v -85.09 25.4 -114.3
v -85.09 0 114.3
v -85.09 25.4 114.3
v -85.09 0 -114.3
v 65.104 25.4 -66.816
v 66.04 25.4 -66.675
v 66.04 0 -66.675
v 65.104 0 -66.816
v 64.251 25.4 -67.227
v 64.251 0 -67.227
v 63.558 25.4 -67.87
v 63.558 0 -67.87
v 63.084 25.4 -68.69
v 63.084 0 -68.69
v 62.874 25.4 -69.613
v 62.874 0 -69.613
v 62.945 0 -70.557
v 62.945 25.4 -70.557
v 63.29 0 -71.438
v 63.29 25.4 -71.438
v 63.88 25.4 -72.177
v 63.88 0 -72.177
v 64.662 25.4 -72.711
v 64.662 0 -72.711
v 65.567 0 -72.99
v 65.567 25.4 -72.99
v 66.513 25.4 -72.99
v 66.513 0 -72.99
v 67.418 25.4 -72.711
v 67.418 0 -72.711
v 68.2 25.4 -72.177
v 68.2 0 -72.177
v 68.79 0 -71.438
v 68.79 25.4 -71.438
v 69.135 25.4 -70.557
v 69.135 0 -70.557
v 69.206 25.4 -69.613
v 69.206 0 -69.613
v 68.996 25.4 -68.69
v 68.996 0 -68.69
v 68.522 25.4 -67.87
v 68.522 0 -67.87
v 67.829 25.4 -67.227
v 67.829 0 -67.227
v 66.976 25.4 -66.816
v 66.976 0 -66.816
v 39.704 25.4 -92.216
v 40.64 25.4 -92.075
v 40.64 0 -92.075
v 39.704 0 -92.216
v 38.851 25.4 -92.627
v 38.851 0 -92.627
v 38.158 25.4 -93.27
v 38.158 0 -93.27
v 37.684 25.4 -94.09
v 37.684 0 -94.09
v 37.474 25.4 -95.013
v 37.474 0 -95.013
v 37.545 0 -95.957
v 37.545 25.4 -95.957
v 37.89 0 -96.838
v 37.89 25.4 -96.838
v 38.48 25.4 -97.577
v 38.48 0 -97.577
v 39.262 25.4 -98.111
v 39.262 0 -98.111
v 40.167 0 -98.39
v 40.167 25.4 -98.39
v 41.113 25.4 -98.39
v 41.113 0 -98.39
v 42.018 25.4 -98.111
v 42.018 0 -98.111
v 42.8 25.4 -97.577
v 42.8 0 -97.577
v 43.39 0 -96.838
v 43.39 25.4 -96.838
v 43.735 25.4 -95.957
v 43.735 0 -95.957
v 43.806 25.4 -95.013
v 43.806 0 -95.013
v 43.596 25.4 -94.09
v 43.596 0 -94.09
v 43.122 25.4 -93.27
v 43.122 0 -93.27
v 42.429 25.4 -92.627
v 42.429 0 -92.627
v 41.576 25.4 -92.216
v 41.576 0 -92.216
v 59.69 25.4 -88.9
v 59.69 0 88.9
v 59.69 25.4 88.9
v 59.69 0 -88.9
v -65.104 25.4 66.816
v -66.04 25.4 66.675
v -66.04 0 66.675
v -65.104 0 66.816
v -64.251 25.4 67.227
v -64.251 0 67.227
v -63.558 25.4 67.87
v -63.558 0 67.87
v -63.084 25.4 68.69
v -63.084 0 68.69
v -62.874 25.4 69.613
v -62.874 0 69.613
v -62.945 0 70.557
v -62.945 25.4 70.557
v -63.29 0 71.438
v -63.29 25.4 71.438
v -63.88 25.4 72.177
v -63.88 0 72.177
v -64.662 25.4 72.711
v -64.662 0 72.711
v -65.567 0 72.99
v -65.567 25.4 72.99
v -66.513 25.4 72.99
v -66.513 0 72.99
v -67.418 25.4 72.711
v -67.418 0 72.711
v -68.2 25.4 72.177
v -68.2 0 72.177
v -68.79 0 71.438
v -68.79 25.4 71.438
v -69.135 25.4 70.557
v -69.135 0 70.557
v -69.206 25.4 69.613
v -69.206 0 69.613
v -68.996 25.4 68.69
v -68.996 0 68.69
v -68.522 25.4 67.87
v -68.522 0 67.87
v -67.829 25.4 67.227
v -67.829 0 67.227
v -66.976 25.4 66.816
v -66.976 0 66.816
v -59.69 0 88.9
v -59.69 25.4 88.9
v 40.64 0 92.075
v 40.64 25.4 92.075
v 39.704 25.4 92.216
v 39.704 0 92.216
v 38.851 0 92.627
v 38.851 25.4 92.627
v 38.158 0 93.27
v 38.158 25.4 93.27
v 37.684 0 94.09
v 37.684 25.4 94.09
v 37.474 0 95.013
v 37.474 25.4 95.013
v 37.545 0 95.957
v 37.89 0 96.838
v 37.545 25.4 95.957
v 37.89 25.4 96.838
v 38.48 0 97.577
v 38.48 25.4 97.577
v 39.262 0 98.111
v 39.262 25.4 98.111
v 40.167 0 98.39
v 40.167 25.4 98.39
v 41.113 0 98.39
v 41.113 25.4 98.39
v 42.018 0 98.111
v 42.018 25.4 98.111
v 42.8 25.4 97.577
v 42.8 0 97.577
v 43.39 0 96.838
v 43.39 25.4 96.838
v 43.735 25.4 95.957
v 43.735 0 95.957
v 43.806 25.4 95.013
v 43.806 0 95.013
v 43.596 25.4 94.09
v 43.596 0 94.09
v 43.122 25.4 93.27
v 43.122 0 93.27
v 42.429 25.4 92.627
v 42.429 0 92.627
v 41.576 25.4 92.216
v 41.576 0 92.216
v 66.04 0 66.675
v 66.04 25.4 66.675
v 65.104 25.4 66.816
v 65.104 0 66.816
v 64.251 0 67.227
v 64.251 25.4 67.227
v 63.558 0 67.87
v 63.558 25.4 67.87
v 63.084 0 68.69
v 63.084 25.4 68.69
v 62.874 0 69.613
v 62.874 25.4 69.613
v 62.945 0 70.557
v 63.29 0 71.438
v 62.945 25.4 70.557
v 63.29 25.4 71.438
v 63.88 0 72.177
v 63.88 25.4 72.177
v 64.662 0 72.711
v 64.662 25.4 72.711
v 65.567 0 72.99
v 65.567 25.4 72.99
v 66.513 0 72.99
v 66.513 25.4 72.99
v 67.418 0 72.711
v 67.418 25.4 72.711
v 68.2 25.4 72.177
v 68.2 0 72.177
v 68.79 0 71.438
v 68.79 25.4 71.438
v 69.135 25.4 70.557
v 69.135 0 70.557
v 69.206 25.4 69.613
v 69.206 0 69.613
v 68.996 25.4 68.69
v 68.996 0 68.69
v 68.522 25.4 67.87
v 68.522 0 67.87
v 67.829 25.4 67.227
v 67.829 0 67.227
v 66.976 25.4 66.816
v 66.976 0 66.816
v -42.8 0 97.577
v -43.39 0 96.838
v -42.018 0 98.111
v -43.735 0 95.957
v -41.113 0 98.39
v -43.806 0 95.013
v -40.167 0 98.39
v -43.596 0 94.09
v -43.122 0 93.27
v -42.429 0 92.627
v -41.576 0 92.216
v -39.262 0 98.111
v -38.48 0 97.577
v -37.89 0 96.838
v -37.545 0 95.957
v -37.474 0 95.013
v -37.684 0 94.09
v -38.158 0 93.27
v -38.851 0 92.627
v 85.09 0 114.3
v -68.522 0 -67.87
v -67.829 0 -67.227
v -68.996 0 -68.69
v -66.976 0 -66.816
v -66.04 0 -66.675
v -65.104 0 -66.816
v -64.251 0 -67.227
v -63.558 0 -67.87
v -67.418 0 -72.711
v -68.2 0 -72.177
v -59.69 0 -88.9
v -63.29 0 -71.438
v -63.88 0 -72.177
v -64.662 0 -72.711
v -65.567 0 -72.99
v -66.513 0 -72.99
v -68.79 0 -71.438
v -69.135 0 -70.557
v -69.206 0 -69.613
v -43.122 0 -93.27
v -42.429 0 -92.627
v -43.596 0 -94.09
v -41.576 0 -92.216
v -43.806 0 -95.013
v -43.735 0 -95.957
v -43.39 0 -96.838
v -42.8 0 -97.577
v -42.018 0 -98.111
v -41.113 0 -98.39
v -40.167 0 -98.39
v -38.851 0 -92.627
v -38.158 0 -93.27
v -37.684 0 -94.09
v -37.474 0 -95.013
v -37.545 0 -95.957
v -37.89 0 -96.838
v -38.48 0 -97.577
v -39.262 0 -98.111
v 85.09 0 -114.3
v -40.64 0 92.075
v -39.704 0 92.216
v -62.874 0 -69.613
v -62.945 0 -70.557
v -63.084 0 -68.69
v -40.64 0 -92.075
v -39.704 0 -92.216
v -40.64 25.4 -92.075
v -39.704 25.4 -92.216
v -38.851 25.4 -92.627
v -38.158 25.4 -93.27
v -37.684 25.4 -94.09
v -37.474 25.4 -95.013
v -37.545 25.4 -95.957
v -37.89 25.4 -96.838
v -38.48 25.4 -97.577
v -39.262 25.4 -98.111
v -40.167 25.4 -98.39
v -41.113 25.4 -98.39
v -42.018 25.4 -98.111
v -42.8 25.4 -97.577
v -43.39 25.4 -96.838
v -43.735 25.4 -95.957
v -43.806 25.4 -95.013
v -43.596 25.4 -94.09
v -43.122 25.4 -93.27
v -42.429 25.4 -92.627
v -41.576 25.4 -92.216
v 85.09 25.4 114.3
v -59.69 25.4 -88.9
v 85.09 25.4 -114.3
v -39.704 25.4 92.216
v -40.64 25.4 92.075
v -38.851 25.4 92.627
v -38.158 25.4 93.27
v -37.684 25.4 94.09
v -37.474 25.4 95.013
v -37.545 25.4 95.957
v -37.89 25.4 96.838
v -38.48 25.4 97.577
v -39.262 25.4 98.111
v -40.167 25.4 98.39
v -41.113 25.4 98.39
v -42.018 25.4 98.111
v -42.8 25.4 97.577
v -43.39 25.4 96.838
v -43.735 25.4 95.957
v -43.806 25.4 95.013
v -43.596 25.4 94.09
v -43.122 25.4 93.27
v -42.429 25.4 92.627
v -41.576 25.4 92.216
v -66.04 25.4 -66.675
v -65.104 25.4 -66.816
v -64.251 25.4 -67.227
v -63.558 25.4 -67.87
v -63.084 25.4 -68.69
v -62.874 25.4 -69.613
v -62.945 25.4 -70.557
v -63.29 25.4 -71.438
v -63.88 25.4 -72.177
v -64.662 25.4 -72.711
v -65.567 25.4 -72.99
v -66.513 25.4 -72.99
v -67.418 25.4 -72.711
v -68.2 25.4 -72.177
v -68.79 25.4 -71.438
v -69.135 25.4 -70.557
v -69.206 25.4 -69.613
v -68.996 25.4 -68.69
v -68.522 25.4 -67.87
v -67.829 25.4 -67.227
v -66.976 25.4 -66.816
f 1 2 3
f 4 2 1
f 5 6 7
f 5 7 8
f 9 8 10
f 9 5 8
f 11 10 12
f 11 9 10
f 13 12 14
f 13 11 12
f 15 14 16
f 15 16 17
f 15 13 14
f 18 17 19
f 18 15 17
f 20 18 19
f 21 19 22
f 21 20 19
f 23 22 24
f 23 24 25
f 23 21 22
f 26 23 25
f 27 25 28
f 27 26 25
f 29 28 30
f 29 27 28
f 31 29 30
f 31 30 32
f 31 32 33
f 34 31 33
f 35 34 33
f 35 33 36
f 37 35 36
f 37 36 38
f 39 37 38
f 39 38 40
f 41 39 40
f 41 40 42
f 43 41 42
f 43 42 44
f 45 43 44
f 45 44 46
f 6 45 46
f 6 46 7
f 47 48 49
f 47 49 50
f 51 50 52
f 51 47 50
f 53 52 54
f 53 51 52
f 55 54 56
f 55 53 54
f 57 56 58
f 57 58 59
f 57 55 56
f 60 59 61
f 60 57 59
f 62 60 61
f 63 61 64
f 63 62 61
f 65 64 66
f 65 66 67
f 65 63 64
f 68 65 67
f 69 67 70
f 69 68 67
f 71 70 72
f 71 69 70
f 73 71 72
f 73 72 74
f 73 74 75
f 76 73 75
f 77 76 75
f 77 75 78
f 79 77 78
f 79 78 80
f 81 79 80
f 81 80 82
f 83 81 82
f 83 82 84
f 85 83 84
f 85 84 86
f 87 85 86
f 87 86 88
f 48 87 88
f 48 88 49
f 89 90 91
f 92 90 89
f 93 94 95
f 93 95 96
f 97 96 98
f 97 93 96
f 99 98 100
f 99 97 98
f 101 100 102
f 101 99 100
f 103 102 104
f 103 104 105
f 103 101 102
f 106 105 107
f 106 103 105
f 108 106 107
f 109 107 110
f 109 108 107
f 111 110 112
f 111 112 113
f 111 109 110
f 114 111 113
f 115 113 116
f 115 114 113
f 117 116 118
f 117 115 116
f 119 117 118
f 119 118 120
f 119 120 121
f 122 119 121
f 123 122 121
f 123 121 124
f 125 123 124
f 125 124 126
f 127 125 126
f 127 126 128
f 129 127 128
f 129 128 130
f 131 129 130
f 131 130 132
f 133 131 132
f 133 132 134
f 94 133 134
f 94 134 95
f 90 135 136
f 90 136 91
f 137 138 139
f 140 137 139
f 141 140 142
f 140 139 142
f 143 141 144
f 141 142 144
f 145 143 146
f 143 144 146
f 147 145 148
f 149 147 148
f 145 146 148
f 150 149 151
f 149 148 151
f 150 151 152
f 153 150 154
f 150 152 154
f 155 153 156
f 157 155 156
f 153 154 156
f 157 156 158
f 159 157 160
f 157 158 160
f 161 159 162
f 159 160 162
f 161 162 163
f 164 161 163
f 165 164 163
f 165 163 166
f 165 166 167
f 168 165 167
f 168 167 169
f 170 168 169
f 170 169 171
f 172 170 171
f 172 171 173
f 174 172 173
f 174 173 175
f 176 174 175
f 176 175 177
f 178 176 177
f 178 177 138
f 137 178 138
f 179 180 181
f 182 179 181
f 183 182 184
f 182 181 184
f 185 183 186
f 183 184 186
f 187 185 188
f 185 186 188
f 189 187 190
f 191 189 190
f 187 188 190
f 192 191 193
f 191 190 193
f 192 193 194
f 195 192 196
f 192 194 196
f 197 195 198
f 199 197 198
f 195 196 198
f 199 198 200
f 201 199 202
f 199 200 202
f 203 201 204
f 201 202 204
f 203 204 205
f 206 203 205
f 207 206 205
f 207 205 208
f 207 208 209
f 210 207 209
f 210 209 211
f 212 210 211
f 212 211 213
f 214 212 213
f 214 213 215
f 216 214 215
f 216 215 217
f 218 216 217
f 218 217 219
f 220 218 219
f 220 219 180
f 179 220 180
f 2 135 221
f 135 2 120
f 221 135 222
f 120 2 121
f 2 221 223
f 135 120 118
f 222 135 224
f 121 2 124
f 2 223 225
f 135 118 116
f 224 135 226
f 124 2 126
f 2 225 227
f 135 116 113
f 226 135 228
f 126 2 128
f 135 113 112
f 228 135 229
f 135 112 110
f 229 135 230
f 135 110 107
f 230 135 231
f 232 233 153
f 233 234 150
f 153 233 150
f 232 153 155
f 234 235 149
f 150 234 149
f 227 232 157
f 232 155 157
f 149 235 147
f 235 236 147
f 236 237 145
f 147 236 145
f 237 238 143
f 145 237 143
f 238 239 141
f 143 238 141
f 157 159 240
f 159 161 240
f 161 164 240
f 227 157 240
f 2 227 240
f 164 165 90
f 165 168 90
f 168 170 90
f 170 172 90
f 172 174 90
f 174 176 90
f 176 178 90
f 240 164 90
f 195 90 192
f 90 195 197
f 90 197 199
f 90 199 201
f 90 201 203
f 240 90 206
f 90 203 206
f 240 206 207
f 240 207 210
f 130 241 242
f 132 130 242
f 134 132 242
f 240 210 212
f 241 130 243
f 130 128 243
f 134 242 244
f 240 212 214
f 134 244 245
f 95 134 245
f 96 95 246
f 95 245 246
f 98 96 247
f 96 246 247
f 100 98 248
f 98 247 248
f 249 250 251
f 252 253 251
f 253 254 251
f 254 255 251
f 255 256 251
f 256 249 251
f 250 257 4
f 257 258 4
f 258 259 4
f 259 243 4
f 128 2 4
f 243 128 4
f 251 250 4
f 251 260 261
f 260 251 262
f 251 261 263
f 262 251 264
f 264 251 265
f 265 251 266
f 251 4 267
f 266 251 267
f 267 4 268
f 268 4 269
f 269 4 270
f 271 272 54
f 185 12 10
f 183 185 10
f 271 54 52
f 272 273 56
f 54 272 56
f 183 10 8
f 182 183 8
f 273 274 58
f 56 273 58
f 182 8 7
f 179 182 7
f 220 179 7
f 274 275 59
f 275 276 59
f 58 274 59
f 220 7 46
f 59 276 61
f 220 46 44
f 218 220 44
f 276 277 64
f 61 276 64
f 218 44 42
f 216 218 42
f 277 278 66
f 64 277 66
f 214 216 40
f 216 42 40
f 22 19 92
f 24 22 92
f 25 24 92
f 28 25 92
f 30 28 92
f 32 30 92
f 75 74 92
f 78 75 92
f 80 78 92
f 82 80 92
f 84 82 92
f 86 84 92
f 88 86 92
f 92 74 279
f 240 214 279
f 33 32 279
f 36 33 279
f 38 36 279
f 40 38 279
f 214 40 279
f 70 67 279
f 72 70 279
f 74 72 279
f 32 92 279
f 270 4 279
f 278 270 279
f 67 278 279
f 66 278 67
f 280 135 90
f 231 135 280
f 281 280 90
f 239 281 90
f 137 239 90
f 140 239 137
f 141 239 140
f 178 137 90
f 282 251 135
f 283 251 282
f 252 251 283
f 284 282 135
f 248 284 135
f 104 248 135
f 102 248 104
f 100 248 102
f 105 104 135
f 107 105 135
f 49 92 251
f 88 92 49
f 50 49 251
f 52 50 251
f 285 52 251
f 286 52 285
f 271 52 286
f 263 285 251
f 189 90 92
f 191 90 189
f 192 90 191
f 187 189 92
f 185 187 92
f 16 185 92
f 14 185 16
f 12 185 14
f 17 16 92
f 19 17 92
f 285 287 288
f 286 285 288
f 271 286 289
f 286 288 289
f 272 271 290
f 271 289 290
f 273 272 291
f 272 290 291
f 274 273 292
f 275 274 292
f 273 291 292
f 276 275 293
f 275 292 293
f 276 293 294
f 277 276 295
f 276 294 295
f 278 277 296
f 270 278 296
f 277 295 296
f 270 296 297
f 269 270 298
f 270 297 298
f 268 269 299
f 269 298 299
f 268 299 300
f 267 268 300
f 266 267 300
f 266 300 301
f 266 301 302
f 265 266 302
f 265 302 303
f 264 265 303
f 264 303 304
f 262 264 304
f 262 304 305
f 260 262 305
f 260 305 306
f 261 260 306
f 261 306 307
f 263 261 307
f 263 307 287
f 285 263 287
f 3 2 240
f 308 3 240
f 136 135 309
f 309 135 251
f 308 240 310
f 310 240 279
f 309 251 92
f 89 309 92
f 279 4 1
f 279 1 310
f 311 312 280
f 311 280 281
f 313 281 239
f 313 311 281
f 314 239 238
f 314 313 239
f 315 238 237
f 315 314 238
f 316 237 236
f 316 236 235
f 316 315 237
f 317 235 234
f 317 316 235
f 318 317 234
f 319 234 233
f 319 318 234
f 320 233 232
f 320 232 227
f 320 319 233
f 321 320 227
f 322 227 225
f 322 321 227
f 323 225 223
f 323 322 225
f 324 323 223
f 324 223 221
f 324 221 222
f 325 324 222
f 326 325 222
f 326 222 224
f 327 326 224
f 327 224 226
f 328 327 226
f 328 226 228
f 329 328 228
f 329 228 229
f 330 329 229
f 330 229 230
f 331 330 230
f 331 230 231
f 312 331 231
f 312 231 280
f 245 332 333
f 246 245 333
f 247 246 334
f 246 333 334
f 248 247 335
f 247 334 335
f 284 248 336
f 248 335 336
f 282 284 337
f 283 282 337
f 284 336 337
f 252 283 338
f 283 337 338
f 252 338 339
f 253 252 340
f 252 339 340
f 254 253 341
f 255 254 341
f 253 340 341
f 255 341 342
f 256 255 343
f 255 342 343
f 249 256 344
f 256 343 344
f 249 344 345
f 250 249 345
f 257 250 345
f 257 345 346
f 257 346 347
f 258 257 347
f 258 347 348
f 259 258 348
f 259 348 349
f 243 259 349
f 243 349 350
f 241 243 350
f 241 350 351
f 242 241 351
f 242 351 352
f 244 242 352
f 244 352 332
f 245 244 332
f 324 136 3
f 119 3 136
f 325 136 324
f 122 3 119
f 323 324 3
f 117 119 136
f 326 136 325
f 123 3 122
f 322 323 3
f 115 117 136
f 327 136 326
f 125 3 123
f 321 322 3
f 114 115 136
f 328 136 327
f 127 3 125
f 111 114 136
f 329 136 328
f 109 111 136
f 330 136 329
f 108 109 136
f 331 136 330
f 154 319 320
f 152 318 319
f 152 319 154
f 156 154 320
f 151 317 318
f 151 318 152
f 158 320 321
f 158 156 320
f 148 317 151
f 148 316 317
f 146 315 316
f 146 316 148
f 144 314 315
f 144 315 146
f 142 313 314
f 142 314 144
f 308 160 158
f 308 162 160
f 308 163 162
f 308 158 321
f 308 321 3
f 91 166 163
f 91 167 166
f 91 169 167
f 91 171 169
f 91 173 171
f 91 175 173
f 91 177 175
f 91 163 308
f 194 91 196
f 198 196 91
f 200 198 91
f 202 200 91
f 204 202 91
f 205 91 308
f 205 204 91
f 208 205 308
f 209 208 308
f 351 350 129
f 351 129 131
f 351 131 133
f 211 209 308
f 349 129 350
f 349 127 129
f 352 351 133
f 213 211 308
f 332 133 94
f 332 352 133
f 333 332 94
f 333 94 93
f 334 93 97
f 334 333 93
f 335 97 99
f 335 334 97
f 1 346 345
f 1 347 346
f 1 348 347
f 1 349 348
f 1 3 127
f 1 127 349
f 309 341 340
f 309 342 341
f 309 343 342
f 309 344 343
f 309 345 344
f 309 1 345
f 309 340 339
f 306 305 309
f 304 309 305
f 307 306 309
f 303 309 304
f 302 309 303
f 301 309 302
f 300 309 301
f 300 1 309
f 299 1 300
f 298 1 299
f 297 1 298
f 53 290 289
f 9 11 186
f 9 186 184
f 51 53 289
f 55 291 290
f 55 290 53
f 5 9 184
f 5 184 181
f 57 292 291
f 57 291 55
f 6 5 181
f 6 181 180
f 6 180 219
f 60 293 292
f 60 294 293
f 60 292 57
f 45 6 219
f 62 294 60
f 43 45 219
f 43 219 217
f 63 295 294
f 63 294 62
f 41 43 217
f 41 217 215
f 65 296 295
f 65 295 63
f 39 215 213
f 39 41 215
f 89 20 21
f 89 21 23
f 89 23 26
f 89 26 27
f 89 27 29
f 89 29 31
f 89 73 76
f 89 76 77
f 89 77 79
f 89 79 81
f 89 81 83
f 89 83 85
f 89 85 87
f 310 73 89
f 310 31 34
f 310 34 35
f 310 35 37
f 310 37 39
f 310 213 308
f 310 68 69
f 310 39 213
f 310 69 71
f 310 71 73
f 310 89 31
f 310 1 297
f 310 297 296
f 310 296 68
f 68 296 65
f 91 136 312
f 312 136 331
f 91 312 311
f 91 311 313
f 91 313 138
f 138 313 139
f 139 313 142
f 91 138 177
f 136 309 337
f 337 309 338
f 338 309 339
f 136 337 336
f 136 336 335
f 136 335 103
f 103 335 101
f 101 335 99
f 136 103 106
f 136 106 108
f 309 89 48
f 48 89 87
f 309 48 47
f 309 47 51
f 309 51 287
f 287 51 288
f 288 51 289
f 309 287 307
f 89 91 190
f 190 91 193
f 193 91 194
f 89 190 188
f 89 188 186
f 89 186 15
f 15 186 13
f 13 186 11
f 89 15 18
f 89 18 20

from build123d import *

# Parameters (mm, degrees)
SKETCH2_W               = 170.18
SKETCH2_H               = 228.6
SKETCH2_W_2             = 119.38
SKETCH2_H_2             = 177.8
BOSS_EXTRUDE1_DEPTH     = 25.4
CUT_EXTRUDE1_REACH      = 146.741
SKETCH3_R               = 3.175
MIRROR2_COPY_1_REACH    = 146.741
MIRROR2_COPY_1_SKETCH_R = 3.175


with BuildPart() as part:
    # Sketch2 → Boss-Extrude1 (new body)
    with BuildSketch(Plane(origin=(0, 0, 0), x_dir=(1, 0, 0), z_dir=(0, 1, 0))):
        Rectangle(SKETCH2_W, SKETCH2_H)
        Rectangle(SKETCH2_W_2, SKETCH2_H_2, mode=Mode.SUBTRACT)
    extrude(amount=BOSS_EXTRUDE1_DEPTH)

    # Sketch3 → Cut-Extrude1 (cut, up to next)
    with BuildSketch(Plane(origin=(0, 25.4, 0), x_dir=(1, 0, 0), z_dir=(0, 1, 0)), mode=Mode.PRIVATE) as cut_extrude1_sk1:
        with Locations(Location((-66.04, 69.85, 0), (0, 0, 270))):
            Circle(SKETCH3_R)
    cut_extrude1_tool1 = extrude(cut_extrude1_sk1.sketch, amount=-CUT_EXTRUDE1_REACH, mode=Mode.PRIVATE) & part.part
    # Sketch3 → Cut-Extrude1 (cut, up to next)
    with BuildSketch(Plane(origin=(0, 25.4, 0), x_dir=(1, 0, 0), z_dir=(0, 1, 0)), mode=Mode.PRIVATE) as cut_extrude1_sk2:
        with Locations(Location((-40.64, 95.25, 0), (0, 0, 270))):
            Circle(SKETCH3_R)
    cut_extrude1_tool2 = extrude(cut_extrude1_sk2.sketch, amount=-CUT_EXTRUDE1_REACH, mode=Mode.PRIVATE) & part.part
    cut_extrude1_1 = cut_extrude1_tool1.solids().sort_by_distance((-66.04, 25.4, -69.85))[0]
    add(cut_extrude1_1, mode=Mode.SUBTRACT)
    cut_extrude1_2 = cut_extrude1_tool2.solids().sort_by_distance((-40.64, 25.4, -95.25))[0]
    add(cut_extrude1_2, mode=Mode.SUBTRACT)
    cut_extrude1 = cut_extrude1_1 + cut_extrude1_2  # Cut-Extrude1 as one shape, for the pattern or mirror that repeats it

    # Mirror1: Cut-Extrude1 across plane
    add(cut_extrude1.mirror(Plane(origin=(0, 0, 0), x_dir=(0, 0, 1), z_dir=(1, 0, 0))), mode=Mode.SUBTRACT)

    # Mirror2: Cut-Extrude1 across plane
    add(cut_extrude1.mirror(Plane.XY), mode=Mode.SUBTRACT)

    # Mirror2 copy 1 sketch → Mirror2 copy 1 (cut, up to next)
    with BuildSketch(Plane(origin=(0, 25.4, 0), x_dir=(-1, 0, 0), z_dir=(0, 1, 0)), mode=Mode.PRIVATE) as mirror2_copy_1_sk1:
        with Locations(Location((-66.04, 69.85, 0), (0, 0, 270))):
            Circle(MIRROR2_COPY_1_SKETCH_R)
    mirror2_copy_1_tool1 = extrude(mirror2_copy_1_sk1.sketch, amount=-MIRROR2_COPY_1_REACH, mode=Mode.PRIVATE) & part.part
    # Mirror2 copy 1 sketch → Mirror2 copy 1 (cut, up to next)
    with BuildSketch(Plane(origin=(0, 25.4, 0), x_dir=(-1, 0, 0), z_dir=(0, 1, 0)), mode=Mode.PRIVATE) as mirror2_copy_1_sk2:
        with Locations(Location((-40.64, 95.25, 0), (0, 0, 270))):
            Circle(MIRROR2_COPY_1_SKETCH_R)
    mirror2_copy_1_tool2 = extrude(mirror2_copy_1_sk2.sketch, amount=-MIRROR2_COPY_1_REACH, mode=Mode.PRIVATE) & part.part
    add(mirror2_copy_1_tool1.solids().sort_by_distance((66.04, 25.4, 69.85))[0], mode=Mode.SUBTRACT)
    add(mirror2_copy_1_tool2.solids().sort_by_distance((40.64, 25.4, 95.25))[0], mode=Mode.SUBTRACT)


solid = part.part
